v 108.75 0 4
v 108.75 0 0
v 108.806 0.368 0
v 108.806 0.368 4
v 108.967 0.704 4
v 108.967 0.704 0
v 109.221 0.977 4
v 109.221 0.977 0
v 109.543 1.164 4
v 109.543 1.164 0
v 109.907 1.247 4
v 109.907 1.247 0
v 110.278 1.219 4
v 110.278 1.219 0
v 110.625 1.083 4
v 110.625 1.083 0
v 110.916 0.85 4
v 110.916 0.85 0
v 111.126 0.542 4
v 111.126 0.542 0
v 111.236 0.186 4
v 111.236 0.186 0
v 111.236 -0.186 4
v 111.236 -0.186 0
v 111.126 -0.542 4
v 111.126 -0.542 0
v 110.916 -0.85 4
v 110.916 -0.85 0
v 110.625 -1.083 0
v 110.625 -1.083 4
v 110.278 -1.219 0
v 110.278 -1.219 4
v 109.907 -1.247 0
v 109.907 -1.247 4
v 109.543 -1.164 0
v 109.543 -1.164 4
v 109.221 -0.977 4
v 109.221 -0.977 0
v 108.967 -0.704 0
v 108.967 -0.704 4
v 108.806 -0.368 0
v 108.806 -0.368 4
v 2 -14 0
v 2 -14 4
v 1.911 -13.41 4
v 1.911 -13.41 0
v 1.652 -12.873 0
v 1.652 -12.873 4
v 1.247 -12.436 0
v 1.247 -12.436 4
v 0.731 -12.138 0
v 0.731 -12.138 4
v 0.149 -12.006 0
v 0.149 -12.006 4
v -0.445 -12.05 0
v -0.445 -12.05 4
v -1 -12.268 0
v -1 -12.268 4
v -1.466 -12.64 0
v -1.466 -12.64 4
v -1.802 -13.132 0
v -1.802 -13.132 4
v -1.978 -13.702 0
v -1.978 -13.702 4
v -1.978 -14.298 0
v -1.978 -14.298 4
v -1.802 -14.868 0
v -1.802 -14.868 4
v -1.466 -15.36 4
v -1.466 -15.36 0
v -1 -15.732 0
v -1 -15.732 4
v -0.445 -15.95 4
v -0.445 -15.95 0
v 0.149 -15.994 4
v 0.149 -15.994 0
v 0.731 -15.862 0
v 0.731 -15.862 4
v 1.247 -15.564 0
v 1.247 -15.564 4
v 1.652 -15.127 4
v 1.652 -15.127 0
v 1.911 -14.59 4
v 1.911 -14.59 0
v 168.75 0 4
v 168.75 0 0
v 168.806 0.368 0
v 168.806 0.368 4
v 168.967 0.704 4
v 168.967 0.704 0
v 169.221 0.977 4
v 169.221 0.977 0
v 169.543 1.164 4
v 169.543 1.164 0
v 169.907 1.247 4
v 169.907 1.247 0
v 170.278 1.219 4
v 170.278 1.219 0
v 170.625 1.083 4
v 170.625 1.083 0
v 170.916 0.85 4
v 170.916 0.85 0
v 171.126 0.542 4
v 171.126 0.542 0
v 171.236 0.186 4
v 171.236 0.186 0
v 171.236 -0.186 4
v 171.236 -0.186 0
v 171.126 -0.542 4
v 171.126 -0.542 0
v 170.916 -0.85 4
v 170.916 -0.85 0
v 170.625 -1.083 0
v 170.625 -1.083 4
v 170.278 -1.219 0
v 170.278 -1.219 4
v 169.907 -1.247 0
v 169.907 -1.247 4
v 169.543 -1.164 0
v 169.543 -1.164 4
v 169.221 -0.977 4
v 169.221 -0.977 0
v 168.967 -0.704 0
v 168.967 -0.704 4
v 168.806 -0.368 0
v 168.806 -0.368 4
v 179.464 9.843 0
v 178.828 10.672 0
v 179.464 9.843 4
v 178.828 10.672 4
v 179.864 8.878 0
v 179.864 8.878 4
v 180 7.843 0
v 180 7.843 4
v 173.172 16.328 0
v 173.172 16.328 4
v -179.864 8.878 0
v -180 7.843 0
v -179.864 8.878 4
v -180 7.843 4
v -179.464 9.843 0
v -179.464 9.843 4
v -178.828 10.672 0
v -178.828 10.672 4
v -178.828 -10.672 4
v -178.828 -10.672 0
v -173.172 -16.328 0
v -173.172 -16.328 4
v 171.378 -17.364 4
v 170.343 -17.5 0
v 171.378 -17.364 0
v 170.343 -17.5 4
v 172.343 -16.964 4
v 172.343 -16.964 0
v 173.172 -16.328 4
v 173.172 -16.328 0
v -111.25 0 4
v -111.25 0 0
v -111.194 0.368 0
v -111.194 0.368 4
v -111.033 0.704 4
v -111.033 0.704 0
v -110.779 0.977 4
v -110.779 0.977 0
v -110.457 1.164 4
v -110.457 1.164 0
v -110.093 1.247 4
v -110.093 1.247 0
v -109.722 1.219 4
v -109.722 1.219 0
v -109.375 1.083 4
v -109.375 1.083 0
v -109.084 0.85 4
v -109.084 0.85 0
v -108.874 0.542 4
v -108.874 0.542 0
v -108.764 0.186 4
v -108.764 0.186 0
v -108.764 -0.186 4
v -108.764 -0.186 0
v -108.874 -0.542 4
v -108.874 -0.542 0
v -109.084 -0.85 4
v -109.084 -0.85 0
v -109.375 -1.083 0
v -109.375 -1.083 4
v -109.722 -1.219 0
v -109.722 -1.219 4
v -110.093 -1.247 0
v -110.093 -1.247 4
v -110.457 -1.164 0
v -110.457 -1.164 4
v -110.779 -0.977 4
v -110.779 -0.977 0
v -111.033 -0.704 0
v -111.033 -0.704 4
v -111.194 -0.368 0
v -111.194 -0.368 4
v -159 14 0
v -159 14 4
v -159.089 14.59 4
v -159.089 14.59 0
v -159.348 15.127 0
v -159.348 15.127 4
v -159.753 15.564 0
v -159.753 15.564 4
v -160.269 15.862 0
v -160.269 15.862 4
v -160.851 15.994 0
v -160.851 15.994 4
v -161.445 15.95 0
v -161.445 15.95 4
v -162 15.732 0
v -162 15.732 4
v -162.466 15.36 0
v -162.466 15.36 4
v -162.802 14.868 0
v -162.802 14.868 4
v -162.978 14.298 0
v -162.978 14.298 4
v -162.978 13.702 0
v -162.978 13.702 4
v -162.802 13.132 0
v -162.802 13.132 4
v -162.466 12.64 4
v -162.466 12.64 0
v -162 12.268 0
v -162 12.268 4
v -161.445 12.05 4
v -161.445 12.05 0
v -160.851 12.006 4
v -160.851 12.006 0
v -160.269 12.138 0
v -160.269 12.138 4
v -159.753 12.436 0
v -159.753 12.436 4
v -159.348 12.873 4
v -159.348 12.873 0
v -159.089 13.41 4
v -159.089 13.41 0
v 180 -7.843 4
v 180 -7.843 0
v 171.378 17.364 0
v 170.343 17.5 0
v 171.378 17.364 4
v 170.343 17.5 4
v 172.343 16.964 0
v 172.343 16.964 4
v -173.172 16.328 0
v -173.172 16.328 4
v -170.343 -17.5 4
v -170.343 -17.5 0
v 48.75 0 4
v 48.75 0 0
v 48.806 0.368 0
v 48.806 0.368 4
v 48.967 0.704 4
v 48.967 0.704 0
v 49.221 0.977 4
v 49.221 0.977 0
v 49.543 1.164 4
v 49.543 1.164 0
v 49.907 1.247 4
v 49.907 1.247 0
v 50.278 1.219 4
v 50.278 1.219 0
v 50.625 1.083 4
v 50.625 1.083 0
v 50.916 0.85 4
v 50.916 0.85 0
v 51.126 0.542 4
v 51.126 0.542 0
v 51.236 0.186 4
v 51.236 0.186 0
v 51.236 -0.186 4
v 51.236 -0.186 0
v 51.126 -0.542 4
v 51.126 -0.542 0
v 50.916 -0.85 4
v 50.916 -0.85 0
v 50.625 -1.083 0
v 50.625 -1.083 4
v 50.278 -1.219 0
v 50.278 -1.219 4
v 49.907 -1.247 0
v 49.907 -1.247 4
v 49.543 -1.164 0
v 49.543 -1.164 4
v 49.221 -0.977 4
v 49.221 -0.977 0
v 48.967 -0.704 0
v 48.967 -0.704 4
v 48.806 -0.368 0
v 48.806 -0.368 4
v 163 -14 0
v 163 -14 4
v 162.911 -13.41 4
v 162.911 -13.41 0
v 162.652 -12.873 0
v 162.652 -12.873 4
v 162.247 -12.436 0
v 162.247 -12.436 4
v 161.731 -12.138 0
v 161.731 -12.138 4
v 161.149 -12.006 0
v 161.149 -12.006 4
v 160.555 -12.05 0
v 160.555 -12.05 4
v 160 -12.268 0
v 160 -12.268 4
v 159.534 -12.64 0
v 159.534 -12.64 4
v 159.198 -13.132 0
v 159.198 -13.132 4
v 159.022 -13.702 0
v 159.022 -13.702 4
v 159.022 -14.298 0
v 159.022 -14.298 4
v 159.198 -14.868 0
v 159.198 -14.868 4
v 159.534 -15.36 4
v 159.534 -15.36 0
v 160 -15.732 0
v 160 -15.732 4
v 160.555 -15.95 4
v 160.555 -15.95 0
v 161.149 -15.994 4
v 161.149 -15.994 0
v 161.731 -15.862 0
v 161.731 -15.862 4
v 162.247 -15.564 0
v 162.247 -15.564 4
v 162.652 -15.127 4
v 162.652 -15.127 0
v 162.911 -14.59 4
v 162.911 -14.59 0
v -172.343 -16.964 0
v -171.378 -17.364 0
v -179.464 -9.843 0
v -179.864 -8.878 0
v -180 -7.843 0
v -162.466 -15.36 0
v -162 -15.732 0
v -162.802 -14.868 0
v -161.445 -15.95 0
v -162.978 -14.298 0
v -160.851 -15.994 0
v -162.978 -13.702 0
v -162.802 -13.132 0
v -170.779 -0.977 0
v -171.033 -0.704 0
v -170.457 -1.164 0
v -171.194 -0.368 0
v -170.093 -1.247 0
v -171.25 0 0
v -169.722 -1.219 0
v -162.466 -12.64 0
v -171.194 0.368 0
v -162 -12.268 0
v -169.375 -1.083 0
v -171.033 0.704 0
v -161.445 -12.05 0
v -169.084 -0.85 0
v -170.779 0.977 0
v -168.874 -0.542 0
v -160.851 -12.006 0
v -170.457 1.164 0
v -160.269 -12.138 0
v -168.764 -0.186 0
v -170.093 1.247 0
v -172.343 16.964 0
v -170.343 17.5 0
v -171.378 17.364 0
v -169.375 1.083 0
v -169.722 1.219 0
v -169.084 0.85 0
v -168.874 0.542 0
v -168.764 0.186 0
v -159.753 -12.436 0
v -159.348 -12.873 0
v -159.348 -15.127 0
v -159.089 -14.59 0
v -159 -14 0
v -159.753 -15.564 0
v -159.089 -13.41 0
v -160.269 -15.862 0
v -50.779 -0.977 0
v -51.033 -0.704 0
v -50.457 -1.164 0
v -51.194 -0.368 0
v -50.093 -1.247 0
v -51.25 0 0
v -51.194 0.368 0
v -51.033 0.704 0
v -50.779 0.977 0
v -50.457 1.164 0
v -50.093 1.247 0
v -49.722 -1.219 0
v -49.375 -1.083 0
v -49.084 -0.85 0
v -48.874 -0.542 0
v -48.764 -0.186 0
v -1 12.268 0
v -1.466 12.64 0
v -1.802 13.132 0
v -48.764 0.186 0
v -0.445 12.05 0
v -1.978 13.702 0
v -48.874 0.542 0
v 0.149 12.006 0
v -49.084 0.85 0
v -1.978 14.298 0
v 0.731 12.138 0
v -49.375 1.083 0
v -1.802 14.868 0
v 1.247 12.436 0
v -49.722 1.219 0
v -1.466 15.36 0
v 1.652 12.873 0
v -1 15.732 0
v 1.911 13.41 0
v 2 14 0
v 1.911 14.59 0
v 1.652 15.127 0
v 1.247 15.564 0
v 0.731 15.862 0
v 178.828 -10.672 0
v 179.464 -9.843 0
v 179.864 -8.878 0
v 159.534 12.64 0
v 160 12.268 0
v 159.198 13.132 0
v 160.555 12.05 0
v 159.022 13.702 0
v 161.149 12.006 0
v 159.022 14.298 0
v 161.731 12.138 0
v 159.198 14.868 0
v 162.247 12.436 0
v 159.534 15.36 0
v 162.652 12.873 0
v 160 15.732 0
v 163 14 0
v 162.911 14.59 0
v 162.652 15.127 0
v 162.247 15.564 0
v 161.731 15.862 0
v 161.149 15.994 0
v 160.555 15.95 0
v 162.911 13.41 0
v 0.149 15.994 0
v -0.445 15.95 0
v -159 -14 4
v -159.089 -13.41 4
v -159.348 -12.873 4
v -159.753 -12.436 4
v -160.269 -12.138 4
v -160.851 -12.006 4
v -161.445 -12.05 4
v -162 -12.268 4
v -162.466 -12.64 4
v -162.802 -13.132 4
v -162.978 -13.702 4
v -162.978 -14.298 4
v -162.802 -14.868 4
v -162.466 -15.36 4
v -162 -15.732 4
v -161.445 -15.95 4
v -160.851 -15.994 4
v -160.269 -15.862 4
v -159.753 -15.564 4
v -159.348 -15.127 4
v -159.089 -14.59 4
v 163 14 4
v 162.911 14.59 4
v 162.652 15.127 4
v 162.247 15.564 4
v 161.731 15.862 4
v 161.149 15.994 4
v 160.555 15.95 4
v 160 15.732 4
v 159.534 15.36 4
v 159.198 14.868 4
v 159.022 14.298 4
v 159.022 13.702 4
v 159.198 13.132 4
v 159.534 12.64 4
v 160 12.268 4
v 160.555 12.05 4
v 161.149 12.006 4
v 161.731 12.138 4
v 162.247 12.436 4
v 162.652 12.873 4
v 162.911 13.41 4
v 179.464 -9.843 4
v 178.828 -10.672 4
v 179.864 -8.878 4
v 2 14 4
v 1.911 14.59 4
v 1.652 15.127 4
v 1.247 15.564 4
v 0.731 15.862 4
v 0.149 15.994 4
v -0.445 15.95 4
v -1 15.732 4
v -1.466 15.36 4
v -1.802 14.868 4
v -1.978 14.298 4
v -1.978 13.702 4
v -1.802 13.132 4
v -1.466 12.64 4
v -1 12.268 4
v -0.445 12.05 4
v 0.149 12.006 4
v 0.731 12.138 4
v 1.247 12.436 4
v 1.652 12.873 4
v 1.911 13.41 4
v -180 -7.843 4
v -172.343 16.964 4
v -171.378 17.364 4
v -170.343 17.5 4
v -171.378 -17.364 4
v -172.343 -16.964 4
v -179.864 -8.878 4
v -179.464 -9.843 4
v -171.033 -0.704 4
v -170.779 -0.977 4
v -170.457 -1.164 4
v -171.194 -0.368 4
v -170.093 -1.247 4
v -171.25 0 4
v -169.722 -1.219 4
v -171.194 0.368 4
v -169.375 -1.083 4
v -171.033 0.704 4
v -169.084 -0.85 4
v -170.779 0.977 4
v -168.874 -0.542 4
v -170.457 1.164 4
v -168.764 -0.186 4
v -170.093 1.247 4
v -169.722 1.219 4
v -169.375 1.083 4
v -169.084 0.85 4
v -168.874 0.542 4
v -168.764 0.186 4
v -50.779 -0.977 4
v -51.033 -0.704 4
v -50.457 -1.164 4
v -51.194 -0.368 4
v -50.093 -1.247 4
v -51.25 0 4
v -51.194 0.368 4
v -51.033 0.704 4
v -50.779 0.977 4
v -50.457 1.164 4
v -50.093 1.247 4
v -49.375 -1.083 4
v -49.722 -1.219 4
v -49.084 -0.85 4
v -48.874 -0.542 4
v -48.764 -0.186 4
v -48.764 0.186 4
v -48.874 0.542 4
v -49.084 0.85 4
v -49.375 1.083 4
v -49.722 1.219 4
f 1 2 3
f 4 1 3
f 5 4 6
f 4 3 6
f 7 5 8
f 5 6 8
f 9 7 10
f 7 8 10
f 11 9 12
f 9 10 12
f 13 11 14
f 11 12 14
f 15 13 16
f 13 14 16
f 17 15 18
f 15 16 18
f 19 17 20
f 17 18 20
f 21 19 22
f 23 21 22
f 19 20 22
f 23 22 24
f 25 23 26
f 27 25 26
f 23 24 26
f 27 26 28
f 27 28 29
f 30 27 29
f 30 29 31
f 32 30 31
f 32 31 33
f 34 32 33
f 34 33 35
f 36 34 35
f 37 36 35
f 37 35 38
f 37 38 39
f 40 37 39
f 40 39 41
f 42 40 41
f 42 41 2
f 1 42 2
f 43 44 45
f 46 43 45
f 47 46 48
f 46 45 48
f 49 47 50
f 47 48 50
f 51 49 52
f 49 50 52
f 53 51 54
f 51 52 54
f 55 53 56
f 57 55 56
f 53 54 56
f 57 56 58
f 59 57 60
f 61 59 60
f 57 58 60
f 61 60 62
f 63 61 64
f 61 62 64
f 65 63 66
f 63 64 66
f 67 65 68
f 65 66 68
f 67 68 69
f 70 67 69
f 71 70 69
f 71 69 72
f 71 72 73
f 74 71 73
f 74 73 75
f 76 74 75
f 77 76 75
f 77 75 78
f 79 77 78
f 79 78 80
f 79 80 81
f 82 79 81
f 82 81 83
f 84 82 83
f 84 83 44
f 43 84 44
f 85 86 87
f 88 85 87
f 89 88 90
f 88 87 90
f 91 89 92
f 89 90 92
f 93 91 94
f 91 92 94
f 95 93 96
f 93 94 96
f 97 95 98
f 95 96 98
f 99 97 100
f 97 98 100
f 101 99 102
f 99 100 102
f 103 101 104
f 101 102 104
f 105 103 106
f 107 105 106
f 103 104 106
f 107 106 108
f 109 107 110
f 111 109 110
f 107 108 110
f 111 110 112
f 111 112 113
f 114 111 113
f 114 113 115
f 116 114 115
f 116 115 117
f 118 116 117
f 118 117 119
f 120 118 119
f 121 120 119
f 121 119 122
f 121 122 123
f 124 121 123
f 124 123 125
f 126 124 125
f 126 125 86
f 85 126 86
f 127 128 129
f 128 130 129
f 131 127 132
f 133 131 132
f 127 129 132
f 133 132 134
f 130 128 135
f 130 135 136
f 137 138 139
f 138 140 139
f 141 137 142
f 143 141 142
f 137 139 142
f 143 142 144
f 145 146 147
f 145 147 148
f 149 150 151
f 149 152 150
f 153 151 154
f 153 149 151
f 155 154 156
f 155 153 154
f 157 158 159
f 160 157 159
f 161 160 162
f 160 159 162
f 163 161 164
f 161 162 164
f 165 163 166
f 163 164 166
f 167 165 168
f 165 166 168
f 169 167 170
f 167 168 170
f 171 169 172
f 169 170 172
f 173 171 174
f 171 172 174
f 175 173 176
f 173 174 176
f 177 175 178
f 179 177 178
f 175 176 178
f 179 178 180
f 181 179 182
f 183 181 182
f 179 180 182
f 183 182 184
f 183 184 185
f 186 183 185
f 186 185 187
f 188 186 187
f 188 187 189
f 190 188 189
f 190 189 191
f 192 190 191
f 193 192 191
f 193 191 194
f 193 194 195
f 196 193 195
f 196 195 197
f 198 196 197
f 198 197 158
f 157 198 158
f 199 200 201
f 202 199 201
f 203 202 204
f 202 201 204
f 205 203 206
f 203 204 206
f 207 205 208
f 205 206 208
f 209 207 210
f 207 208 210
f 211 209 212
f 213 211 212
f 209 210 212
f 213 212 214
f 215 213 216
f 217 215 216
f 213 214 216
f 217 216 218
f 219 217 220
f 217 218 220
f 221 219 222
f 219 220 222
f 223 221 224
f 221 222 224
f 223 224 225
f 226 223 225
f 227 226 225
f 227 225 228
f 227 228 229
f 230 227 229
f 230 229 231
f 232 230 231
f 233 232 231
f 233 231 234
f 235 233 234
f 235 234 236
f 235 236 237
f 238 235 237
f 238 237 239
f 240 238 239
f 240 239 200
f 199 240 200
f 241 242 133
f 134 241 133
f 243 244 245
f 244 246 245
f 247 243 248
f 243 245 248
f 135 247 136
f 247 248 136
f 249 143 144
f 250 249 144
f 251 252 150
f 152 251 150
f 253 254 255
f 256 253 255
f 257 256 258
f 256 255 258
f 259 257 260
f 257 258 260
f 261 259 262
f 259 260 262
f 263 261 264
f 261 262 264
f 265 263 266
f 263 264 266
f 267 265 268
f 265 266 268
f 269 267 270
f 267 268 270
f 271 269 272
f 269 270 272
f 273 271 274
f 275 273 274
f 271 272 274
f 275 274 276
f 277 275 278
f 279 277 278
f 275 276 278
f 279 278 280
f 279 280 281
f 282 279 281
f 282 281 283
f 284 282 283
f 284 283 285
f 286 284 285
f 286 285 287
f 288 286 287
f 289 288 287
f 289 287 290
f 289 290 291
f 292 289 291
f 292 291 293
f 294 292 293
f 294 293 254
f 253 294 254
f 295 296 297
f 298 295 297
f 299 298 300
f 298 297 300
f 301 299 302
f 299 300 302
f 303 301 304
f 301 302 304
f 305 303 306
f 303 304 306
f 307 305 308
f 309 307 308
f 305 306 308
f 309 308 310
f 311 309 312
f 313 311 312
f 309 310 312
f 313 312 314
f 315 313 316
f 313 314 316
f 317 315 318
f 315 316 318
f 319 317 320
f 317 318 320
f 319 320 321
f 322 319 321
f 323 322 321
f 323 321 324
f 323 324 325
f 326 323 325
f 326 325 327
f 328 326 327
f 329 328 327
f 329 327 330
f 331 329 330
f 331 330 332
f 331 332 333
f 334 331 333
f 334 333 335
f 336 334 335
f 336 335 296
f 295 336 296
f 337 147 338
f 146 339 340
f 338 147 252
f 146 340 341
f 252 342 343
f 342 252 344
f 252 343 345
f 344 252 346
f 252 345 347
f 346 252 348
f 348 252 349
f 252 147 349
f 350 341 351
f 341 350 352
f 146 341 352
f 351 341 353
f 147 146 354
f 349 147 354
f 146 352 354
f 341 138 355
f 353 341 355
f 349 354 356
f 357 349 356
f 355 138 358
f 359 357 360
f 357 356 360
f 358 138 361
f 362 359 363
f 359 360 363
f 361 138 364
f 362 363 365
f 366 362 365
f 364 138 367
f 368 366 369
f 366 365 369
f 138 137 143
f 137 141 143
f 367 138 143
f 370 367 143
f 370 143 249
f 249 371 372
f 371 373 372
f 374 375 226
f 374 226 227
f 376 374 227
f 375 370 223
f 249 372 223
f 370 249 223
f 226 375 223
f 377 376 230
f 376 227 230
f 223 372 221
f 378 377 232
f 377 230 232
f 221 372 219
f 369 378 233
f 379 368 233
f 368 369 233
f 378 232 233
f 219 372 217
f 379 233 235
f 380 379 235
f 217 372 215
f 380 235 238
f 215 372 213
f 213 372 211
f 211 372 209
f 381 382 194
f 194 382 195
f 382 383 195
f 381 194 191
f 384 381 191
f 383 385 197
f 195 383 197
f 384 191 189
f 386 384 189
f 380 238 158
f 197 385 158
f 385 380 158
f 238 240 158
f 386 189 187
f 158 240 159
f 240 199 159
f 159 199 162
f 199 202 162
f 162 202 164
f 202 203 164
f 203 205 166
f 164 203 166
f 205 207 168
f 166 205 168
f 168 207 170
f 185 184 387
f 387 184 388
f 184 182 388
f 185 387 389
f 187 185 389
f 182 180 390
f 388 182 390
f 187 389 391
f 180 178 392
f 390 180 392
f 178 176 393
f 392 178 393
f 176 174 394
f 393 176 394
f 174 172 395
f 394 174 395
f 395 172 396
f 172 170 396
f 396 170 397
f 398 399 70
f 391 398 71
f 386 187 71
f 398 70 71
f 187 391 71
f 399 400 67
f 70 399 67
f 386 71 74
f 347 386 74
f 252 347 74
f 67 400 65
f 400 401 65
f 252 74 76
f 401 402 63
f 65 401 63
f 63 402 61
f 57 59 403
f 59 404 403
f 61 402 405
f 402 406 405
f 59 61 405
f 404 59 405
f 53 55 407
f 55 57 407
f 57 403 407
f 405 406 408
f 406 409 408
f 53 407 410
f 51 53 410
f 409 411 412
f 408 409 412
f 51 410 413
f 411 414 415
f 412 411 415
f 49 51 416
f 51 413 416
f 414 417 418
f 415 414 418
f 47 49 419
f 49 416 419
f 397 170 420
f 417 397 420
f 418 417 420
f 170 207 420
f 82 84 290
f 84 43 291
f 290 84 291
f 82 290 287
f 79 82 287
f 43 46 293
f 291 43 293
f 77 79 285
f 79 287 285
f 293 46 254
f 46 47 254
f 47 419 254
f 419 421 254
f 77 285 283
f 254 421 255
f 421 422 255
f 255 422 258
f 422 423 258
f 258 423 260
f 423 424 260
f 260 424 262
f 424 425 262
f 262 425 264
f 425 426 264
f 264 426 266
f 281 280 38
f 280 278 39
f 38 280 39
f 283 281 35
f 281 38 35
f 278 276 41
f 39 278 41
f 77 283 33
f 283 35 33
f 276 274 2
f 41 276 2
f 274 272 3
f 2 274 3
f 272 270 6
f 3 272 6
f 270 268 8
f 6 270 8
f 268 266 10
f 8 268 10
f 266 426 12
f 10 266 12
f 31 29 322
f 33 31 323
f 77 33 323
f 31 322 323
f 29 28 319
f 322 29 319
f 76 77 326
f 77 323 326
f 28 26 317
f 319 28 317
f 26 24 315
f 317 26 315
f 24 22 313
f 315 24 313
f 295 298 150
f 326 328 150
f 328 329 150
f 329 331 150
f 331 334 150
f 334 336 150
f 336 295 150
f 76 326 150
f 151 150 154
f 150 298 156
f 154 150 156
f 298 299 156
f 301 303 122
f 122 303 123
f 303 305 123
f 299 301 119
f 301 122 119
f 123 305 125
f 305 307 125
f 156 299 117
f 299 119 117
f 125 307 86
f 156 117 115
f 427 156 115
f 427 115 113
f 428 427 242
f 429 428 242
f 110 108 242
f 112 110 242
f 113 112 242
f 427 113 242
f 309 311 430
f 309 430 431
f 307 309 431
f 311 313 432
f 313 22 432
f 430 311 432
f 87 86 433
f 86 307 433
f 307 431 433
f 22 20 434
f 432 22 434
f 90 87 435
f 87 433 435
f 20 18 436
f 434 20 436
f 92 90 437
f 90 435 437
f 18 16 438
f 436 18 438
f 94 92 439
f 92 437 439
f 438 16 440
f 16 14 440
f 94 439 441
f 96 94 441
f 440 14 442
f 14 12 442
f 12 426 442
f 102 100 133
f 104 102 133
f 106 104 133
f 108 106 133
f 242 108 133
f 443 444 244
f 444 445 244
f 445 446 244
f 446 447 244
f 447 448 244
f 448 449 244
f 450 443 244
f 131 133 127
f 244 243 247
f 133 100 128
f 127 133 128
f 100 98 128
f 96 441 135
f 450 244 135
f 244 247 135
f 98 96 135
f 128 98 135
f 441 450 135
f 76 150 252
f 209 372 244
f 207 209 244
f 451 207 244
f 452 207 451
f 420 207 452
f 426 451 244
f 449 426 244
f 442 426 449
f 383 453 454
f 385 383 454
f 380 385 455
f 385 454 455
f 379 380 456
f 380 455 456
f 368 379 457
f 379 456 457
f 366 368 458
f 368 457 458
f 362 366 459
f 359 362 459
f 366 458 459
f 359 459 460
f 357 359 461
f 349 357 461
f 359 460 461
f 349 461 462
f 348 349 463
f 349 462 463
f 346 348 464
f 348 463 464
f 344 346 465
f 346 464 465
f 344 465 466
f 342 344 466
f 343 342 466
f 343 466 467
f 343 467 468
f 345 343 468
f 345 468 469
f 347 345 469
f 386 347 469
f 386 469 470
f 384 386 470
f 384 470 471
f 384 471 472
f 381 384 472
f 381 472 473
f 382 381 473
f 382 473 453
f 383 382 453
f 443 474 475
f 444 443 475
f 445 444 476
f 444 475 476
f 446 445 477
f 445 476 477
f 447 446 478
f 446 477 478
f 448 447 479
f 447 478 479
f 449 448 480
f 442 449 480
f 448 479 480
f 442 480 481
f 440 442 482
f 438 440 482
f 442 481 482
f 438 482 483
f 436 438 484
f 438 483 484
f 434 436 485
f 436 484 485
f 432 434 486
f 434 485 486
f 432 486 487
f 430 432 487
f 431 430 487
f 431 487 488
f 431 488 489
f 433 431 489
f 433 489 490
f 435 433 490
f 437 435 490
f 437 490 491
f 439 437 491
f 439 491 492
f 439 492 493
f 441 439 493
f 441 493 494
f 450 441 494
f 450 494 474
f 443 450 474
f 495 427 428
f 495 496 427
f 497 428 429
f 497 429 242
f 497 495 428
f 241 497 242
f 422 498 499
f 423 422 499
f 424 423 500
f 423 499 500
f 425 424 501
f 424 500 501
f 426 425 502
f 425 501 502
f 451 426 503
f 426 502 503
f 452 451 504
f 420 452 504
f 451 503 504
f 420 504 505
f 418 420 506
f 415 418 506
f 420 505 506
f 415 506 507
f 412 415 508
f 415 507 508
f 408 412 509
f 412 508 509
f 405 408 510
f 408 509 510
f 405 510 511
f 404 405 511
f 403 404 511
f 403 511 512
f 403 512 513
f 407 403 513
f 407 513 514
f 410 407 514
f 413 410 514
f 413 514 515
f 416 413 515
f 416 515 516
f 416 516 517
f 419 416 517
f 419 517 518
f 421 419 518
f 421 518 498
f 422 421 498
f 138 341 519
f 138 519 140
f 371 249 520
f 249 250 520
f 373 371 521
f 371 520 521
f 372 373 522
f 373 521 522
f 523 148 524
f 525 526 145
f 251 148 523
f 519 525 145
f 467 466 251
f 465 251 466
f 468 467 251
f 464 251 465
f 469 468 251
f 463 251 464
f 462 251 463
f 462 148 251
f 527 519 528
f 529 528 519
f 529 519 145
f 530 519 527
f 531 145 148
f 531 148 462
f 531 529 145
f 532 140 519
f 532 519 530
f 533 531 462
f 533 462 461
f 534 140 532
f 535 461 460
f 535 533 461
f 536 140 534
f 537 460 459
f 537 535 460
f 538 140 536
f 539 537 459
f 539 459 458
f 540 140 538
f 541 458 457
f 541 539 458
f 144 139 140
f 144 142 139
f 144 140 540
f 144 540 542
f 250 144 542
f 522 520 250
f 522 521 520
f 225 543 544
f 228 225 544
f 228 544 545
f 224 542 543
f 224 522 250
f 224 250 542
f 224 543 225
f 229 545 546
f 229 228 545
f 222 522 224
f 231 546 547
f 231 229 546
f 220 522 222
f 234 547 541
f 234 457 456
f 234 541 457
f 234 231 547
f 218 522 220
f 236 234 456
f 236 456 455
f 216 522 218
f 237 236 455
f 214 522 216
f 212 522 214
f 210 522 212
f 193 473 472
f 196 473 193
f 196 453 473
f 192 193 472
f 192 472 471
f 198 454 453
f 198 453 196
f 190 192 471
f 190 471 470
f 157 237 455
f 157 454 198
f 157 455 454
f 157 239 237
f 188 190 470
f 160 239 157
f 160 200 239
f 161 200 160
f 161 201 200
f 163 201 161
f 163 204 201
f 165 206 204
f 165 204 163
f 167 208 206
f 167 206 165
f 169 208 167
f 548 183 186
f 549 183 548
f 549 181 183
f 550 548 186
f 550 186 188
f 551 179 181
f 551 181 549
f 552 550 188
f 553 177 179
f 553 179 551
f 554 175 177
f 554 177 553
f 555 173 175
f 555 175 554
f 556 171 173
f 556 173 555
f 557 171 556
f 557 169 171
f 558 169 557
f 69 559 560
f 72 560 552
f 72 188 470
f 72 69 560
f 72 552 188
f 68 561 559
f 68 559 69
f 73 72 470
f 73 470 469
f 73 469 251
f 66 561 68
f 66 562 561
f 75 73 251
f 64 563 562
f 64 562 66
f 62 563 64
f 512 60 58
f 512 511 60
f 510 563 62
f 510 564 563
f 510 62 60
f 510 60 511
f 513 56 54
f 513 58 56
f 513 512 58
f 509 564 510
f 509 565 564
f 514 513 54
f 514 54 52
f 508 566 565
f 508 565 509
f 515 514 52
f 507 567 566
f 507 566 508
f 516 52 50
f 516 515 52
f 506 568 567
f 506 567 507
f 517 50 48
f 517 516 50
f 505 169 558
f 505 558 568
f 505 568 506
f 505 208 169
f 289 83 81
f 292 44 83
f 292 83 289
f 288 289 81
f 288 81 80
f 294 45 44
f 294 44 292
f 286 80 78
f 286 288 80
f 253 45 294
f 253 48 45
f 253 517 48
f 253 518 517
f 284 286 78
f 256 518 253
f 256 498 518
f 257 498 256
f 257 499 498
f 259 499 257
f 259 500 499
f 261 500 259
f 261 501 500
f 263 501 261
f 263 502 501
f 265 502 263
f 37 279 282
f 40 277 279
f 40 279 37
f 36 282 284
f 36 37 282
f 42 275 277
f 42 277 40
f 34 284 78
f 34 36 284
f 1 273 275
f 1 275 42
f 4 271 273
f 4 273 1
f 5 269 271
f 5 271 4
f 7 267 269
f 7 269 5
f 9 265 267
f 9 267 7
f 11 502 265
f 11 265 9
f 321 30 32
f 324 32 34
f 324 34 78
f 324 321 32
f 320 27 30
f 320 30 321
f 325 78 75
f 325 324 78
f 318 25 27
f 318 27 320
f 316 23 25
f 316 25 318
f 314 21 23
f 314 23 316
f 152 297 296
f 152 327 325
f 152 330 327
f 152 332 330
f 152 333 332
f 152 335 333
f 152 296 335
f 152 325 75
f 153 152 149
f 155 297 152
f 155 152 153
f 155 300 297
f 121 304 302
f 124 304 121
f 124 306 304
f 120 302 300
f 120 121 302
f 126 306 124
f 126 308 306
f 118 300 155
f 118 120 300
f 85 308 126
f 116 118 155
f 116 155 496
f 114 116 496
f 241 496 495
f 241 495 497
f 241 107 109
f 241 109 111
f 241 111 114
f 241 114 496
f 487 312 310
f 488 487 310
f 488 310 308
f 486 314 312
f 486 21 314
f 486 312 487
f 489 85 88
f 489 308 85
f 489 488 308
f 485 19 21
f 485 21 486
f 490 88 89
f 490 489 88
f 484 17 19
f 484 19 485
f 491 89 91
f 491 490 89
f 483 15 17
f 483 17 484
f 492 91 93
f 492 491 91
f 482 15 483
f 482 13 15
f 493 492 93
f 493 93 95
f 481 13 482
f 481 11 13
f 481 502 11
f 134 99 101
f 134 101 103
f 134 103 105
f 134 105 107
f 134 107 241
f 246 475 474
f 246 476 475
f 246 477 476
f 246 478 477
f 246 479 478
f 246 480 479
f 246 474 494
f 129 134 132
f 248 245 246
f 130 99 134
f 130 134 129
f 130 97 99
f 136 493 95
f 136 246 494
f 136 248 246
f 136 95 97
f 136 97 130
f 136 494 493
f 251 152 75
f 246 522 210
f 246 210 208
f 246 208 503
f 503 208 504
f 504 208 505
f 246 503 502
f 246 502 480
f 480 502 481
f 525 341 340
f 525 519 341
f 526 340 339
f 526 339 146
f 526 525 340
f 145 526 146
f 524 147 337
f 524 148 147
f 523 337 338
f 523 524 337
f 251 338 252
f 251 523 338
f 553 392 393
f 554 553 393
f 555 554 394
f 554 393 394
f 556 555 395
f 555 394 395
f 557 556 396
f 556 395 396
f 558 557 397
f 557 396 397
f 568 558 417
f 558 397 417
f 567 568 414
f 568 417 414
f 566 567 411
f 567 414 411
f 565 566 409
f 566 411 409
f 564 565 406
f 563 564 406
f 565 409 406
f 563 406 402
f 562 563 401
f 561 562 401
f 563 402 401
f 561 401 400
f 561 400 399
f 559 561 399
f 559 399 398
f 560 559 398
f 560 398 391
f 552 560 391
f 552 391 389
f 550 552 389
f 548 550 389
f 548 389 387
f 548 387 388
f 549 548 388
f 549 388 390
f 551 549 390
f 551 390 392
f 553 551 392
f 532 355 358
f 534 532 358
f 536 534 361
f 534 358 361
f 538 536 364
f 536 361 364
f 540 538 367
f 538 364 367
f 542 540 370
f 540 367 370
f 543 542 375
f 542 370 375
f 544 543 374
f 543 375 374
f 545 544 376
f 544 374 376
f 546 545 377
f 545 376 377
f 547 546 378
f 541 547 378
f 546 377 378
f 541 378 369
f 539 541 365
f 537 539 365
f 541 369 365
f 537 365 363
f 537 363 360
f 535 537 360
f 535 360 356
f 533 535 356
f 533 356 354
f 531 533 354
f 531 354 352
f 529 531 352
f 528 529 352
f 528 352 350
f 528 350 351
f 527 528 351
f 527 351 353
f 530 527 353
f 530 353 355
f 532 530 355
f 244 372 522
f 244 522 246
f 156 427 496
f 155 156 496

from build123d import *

# Parameters (mm, degrees)
CROQUIS1_W              = 360
CROQUIS1_H              = 35
SALIENTE_EXTRUIR1_DEPTH = 4
CROQUIS2_R              = 2
CORTAR_EXTRUIR1_DEPTH   = 5
TALADRO_ROSCADO_M31_D   = 2.5
CHAFL_N1_SIZE           = 8
REDONDEO2_R             = 4


with BuildPart() as part:
    # Croquis1 → Saliente-Extruir1 (new body)
    with BuildSketch(Plane.XY):
        Rectangle(CROQUIS1_W, CROQUIS1_H)
    extrude(amount=SALIENTE_EXTRUIR1_DEPTH)

    # Croquis2 → Cortar-Extruir1 (cut)
    with BuildSketch(Plane.XY.offset(4)):
        with Locations((0, 14)):
            Circle(CROQUIS2_R)
        with Locations((0, -14)):
            Circle(CROQUIS2_R)
        with Locations((161, 14)):
            Circle(CROQUIS2_R)
        with Locations((161, -14)):
            Circle(CROQUIS2_R)
        with Locations((-161, 14)):
            Circle(CROQUIS2_R)
        with Locations((-161, -14)):
            Circle(CROQUIS2_R)
    extrude(amount=-CORTAR_EXTRUIR1_DEPTH, mode=Mode.SUBTRACT)

    # Taladro roscado M31 (through all)
    with Locations(Plane.XY.offset(4)):
        with Locations((-170, 0), (-110, 0), (-50, 0), (50, 0), (110, 0), (170, 0)):
            Hole(TALADRO_ROSCADO_M31_D / 2)

    # Chaflán1
    chafl_n1_edges = [part.edges().sort_by_distance(p)[0] for p in [
        (180, -17.5, 2),
        (-180, -17.5, 2),
        (-180, 17.5, 2),
        (180, 17.5, 2),
    ]]
    chamfer(chafl_n1_edges, length=CHAFL_N1_SIZE)

    # Redondeo2
    redondeo2_edges = [part.edges().sort_by_distance(p)[0] for p in [
        (180, 9.5, 2),
        (180, -9.5, 2),
        (-172, -17.5, 2),
        (172, -17.5, 2),
        (-172, 17.5, 2),
        (172, 17.5, 2),
        (-180, 9.5, 2),
        (-180, -9.5, 2),
    ]]
    fillet(redondeo2_edges, radius=REDONDEO2_R)


solid = part.part
